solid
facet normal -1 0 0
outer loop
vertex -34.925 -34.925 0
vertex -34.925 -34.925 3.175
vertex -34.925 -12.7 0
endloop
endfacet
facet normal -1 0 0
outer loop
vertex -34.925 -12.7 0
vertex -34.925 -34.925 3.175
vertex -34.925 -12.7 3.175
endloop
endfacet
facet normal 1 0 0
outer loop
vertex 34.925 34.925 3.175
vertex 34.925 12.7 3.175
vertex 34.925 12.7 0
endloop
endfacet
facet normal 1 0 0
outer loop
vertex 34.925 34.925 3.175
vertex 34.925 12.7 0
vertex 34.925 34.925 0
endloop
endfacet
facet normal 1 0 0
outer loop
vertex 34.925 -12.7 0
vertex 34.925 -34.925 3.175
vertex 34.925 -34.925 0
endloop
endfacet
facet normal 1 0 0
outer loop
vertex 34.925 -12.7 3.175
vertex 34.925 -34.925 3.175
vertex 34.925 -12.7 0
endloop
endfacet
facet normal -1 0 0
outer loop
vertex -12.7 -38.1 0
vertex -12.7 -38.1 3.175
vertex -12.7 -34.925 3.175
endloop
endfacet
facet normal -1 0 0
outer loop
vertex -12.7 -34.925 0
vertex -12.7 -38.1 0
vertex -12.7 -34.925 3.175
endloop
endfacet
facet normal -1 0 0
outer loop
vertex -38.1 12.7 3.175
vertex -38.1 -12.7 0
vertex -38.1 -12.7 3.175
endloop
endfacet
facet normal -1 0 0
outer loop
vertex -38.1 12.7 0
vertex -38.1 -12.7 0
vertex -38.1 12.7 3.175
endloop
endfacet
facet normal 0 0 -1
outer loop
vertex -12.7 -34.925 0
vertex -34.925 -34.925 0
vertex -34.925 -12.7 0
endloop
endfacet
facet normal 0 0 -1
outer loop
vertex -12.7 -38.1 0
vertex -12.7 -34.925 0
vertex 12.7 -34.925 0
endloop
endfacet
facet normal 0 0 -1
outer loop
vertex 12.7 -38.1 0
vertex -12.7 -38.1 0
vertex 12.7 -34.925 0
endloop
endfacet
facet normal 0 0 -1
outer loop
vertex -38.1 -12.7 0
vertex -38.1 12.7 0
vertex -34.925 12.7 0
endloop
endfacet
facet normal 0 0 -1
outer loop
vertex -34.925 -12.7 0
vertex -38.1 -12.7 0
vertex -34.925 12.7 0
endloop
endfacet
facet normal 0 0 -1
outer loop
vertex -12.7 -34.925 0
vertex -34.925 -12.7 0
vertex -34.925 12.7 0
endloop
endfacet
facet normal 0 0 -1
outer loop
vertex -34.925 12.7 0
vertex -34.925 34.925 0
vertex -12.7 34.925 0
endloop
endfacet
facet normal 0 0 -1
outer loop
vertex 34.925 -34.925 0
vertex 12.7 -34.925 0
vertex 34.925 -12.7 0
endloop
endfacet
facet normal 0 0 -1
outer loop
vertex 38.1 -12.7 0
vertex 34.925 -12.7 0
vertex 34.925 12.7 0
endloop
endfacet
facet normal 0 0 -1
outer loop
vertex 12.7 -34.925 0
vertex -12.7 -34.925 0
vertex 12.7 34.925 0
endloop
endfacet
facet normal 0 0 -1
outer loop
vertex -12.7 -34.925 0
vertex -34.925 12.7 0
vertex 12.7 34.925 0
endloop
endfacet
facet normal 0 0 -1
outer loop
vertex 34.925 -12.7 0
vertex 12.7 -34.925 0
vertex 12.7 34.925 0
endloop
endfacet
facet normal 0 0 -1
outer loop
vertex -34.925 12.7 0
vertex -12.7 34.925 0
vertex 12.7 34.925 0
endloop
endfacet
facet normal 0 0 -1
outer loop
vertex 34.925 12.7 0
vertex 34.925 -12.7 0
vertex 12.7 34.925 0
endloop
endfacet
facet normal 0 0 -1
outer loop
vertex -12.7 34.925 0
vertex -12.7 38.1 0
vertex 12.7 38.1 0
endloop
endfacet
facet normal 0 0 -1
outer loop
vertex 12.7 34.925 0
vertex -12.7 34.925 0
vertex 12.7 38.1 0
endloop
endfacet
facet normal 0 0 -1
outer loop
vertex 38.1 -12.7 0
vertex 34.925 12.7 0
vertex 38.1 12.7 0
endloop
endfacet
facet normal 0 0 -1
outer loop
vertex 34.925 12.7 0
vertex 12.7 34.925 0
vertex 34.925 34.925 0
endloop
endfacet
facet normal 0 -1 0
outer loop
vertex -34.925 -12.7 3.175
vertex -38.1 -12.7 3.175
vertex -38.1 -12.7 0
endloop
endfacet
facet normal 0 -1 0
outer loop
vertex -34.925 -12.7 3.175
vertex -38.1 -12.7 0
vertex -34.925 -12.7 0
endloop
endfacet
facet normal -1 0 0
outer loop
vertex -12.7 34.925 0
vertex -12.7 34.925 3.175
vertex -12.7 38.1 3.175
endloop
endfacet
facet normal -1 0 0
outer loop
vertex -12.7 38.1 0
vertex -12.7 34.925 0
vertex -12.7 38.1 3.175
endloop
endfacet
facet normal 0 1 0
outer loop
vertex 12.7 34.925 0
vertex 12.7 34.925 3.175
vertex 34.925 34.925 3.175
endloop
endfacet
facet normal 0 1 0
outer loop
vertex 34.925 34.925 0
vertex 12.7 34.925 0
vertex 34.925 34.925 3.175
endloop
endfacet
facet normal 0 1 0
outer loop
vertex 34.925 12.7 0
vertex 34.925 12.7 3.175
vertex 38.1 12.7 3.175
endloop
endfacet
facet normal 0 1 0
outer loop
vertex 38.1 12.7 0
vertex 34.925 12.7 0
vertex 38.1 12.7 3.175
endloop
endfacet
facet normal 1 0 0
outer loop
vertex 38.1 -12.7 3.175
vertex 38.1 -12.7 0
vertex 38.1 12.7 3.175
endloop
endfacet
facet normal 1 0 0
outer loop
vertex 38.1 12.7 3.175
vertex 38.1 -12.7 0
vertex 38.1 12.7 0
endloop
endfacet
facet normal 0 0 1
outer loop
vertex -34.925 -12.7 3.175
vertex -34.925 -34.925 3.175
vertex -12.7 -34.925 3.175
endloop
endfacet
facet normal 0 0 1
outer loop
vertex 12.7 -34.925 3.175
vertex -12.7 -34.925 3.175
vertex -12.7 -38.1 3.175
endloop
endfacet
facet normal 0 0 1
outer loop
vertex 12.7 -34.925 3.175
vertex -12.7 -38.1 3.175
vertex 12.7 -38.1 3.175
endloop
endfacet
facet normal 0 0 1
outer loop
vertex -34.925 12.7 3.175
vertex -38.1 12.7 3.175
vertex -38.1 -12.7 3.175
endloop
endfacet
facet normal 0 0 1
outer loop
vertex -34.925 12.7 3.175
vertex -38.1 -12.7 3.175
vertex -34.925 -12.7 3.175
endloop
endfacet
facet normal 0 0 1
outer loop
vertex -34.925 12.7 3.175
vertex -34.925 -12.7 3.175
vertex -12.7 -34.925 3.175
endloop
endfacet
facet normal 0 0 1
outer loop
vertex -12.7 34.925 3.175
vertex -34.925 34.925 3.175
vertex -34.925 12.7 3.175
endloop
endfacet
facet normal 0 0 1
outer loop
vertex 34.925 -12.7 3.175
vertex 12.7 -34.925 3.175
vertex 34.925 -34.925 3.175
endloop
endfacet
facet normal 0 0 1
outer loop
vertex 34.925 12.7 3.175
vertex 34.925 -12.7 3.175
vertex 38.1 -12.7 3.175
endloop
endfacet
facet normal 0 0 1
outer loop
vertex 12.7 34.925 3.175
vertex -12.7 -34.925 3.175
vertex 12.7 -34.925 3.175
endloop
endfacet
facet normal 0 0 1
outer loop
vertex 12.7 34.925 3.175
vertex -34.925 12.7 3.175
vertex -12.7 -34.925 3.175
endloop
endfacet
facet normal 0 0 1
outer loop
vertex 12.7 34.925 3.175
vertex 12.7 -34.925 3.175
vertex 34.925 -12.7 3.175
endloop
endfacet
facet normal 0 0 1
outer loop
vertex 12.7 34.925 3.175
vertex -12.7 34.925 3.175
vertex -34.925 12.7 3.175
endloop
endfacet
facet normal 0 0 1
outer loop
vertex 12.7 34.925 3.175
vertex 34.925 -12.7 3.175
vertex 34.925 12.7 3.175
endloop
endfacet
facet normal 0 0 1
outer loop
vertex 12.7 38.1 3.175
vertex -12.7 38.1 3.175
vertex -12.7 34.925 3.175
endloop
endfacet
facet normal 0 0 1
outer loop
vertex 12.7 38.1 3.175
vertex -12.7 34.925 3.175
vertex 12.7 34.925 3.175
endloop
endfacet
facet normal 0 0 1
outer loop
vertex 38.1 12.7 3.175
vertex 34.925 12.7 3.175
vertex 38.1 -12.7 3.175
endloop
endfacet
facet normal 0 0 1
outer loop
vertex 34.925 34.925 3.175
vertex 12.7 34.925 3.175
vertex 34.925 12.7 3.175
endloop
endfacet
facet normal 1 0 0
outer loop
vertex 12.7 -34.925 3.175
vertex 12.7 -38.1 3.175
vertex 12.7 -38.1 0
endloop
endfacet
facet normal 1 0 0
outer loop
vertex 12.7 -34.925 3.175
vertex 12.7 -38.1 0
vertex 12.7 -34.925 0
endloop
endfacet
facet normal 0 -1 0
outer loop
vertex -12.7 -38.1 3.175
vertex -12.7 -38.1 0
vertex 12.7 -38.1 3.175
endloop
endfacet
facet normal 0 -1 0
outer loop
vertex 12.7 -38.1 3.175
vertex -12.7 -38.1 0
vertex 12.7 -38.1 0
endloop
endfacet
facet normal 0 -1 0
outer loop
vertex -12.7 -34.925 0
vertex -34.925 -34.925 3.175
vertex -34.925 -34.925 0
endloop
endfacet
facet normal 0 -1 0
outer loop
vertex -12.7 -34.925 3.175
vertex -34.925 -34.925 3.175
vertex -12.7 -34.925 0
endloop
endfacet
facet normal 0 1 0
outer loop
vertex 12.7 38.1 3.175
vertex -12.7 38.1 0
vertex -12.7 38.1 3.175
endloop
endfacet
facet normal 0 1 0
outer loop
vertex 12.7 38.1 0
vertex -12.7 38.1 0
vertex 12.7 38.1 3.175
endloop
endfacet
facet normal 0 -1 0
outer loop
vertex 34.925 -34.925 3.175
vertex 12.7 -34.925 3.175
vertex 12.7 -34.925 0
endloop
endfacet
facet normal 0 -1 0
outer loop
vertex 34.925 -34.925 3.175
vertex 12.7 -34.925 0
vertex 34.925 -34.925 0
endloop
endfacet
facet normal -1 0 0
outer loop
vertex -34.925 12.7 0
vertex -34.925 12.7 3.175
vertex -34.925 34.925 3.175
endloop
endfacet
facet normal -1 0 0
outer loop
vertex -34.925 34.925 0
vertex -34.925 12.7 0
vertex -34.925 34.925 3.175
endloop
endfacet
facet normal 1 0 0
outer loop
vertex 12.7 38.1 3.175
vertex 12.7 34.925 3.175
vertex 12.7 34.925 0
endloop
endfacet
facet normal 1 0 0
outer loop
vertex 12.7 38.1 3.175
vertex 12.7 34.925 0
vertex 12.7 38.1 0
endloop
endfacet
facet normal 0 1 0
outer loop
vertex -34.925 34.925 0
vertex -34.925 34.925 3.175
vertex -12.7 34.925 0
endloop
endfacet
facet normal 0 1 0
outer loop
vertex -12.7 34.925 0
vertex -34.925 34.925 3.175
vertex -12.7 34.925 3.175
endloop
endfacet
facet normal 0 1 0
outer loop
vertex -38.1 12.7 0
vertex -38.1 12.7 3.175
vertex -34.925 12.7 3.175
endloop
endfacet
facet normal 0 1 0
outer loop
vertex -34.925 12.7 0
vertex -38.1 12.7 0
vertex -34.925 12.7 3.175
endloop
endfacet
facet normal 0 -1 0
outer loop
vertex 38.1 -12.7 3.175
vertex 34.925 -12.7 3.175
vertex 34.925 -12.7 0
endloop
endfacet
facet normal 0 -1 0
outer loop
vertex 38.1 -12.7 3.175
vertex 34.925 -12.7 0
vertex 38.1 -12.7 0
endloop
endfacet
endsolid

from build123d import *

# Parameters (mm, degrees)
F0_W     = 76.2
F0_H     = 76.2
F1_DEPTH = 3.175
F2_W     = 3.175
F2_H     = 3.175
F2_W_2   = 22.225
F2_H_2   = 22.225
F3_DEPTH = 25.4


with BuildPart() as f1:
    # F0 (on Top) → F1 (new body)
    with BuildSketch(Plane.XY):
        Rectangle(F0_W, F0_H)
    extrude(amount=F1_DEPTH)

    # F2 (on face) → F3 (cut)
    with BuildSketch(Plane.XY.offset(3.175)):
        with Locations((-36.5125, 36.5125)):
            Rectangle(F2_W, F2_H)
        with Locations((-23.8125, 36.5125)):
            Rectangle(F2_W_2, F2_H)
        with Locations((-36.5125, 23.8125)):
            Rectangle(F2_W, F2_H_2)
        with Locations((-36.5125, -23.8125)):
            Rectangle(F2_W, F2_H_2)
        with Locations((-36.5125, -36.5125)):
            Rectangle(F2_W, F2_H)
        with Locations((-23.8125, -36.5125)):
            Rectangle(F2_W_2, F2_H)
        with Locations((23.8125, -36.5125)):
            Rectangle(F2_W_2, F2_H)
        with Locations((36.5125, -23.8125)):
            Rectangle(F2_W, F2_H_2)
        with Locations((36.5125, -36.5125)):
            Rectangle(F2_W, F2_H)
        with Locations((36.5125, 23.8125)):
            Rectangle(F2_W, F2_H_2)
        with Locations((23.8125, 36.5125)):
            Rectangle(F2_W_2, F2_H)
        with Locations((36.5125, 36.5125)):
            Rectangle(F2_W, F2_H)
    extrude(amount=-F3_DEPTH, mode=Mode.SUBTRACT)


solid = f1.part
